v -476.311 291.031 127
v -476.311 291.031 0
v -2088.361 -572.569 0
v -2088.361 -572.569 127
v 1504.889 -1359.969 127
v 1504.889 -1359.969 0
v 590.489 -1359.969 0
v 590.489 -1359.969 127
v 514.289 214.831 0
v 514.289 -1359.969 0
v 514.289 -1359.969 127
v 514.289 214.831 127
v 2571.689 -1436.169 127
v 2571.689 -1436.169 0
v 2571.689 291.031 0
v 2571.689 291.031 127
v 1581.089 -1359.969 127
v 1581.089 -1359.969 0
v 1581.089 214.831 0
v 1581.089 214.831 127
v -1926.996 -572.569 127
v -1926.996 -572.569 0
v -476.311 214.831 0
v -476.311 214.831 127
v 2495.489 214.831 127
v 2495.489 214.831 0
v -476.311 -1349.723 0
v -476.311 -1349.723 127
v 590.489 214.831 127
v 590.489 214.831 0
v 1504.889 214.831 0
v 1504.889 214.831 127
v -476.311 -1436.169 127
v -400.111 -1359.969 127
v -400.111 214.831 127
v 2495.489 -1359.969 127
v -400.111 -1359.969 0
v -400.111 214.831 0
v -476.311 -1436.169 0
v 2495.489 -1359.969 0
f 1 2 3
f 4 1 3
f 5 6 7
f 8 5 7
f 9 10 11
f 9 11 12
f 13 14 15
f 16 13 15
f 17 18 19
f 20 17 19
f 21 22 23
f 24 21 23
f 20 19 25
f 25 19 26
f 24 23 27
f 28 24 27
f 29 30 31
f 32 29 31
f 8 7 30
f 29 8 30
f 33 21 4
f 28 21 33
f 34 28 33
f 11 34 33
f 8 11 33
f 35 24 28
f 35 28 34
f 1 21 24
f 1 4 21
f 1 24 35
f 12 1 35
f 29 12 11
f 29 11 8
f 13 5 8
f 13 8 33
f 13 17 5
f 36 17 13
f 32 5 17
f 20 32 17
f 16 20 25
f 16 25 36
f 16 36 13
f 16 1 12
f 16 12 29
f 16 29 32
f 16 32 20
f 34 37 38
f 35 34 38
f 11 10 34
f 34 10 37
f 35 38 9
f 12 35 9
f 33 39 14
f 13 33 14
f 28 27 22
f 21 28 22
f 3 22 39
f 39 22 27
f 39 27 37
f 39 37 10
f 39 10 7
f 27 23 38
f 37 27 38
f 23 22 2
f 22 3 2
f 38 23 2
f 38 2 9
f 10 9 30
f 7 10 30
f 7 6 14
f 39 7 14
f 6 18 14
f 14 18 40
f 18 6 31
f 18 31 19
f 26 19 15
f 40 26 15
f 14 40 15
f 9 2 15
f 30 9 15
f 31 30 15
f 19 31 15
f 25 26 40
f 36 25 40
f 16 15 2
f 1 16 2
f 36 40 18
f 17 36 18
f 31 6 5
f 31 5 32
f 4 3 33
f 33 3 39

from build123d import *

# Parameters (mm, degrees)
F0_W     = 76.2
F0_H     = 1574.8
F1_DEPTH = 127


with BuildPart() as f1:
    # F0 (on Top) → F1 (new body)
    with BuildSketch(Plane.XY):
        Polygon((-476.311119, 214.830956), (-476.311119, 291.030956), (-2088.360895, -572.569044), (-476.311119, -1436.169044), (-476.311119, -1349.723475), (-1926.996189, -572.569044), align=None)
        Polygon((2571.688881, 291.030956), (-476.311119, 291.030956), (-476.311119, 214.830956), (-476.311119, -1349.723475), (-476.311119, -1436.169044), (2571.688881, -1436.169044), align=None)
        Polygon((-400.111119, -1359.969044), (-400.111119, 214.830956), (514.288881, 214.830956), (590.488881, 214.830956), (1504.888881, 214.830956), (1581.088881, 214.830956), (2495.488881, 214.830956), (2495.488881, -1359.969044), (1581.088881, -1359.969044), (1504.888881, -1359.969044), (590.488881, -1359.969044), (514.288881, -1359.969044), align=None, mode=Mode.SUBTRACT)
        with Locations((552.388881, -572.569044)):
            Rectangle(F0_W, F0_H)
        with Locations((1542.988881, -572.569044)):
            Rectangle(F0_W, F0_H)
    extrude(amount=F1_DEPTH)


solid = f1.part
